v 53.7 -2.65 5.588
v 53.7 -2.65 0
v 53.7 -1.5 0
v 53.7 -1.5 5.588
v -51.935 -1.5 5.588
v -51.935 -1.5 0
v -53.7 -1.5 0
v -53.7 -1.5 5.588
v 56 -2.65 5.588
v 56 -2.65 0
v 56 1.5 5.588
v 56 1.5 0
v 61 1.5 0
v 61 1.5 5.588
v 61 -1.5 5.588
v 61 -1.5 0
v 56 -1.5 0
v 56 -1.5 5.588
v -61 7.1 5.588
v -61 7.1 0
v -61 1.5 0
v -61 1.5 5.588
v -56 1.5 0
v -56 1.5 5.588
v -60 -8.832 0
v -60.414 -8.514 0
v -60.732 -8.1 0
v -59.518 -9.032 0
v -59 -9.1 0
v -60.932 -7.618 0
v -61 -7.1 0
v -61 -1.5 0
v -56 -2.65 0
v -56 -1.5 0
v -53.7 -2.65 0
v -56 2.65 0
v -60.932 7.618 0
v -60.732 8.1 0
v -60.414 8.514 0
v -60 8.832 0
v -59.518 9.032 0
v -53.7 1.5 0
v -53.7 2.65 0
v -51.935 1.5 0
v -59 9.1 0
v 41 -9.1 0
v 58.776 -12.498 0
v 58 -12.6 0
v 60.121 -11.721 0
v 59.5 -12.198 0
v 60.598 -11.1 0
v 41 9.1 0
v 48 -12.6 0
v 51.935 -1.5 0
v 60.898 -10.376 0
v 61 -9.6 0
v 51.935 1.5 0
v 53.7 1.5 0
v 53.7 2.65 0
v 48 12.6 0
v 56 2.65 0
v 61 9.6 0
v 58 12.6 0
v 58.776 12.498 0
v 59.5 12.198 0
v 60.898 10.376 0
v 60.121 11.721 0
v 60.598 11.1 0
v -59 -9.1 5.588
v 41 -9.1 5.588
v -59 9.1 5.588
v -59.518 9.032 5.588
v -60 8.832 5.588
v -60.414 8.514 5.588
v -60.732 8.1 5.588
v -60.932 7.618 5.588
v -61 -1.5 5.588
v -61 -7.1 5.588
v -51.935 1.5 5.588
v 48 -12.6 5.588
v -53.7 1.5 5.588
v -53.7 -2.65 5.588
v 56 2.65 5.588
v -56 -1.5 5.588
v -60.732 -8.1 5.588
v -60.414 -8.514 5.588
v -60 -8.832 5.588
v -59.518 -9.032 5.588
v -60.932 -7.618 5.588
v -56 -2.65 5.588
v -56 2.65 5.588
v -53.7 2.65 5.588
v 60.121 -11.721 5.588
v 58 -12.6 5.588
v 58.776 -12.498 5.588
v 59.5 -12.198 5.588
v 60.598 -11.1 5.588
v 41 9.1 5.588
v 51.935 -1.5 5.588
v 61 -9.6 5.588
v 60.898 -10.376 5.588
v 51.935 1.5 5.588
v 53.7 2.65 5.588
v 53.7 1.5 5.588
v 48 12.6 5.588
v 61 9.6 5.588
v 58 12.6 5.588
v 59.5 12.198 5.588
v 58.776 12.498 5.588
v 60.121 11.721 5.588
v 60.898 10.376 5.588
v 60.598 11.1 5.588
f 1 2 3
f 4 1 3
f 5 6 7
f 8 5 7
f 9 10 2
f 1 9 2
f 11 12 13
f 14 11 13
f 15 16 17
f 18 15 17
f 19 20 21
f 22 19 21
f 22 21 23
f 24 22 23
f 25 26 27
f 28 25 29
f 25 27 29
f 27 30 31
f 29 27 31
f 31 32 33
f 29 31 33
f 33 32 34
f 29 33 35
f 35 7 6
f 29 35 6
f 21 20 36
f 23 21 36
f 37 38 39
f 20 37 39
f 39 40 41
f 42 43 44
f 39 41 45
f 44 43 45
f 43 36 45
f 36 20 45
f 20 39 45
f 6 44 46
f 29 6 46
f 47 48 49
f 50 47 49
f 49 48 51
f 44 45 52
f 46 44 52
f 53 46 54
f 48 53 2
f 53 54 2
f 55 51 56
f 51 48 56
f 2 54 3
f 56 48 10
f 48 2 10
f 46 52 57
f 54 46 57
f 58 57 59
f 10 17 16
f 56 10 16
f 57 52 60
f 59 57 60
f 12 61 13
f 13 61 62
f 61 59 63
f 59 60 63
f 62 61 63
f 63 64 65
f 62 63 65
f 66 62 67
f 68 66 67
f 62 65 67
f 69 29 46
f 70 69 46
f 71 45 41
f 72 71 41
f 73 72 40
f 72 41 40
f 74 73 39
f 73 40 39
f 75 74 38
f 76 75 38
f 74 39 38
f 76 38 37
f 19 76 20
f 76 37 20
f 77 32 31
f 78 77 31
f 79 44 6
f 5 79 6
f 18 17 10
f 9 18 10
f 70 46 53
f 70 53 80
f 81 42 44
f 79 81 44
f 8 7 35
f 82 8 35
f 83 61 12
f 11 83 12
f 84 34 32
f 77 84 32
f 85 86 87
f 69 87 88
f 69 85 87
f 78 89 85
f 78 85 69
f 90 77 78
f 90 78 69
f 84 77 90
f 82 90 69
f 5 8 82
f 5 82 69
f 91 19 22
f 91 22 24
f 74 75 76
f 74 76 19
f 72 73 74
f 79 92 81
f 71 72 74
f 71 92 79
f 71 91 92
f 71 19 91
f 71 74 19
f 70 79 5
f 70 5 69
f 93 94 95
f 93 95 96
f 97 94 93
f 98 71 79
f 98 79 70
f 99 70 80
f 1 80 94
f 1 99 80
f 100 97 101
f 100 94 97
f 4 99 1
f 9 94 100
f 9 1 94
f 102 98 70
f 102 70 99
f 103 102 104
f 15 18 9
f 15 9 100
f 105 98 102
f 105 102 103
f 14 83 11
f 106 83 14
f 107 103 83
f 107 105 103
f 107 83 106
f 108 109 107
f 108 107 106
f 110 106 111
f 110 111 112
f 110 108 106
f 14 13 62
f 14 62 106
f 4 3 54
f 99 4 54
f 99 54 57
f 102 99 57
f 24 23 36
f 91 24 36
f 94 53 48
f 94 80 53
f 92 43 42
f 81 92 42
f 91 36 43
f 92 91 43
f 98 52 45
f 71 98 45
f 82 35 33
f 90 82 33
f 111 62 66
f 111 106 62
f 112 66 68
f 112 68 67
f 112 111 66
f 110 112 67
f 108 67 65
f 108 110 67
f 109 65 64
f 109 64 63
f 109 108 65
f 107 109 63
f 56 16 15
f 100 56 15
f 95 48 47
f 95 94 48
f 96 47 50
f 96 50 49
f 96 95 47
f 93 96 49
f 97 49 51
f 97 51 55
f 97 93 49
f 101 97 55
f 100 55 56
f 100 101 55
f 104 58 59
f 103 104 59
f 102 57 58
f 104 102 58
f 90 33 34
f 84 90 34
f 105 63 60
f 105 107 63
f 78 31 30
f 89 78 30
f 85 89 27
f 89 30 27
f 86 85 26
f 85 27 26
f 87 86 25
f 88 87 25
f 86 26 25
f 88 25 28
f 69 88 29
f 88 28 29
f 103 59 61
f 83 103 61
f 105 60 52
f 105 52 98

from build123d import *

# Parameters (mm, degrees)
F1_DEPTH = 5.588
F2_W     = 20
F2_H     = 5.588
F3_DEPTH = 3.5
F4_SIZE2 = 6.99999
F4_SIZE  = 3.49999
F5_W     = 20
F5_H     = 5.588
F6_DEPTH = 3.5
F7_SIZE2 = 3.49999
F7_SIZE  = 6.99999
F8_R     = 3


# Not quite as in the source:
# - a fillet or chamfer is up to 0.001 mm smaller than in the source, because OpenCascade refuses the exact size


with BuildPart() as f1:
    # F0 (on Top) → F1 (new body)
    with BuildSketch(Plane.XY):
        with BuildLine():
            Line((61, 9.1), (-59, 9.1))
            ThreePointArc((-59, 9.1), (-60.4142135624, 8.5142135624), (-61, 7.1))
            Line((-61, 7.1), (-61, 1.5))
            Line((-61, 1.5), (-56, 1.5))
            Line((-56, 1.5), (-56, 2.65))
            Line((-56, 2.65), (-53.7, 2.65))
            Line((-53.7, 2.65), (-53.7, 1.5))
            Line((-53.7, 1.5), (-51.934869796, 1.5))
            Line((-51.934869796, 1.5), (-51.934869796, -1.5))
            Line((-51.934869796, -1.5), (-53.7, -1.5))
            Line((-53.7, -1.5), (-53.7, -2.65))
            Line((-53.7, -2.65), (-56, -2.65))
            Line((-56, -2.65), (-56, -1.5))
            Line((-56, -1.5), (-61, -1.5))
            Line((-61, -1.5), (-61, -7.1))
            ThreePointArc((-61, -7.1), (-60.4142135624, -8.5142135624), (-59, -9.1))
            Line((-59, -9.1), (61, -9.1))
            Line((61, -9.1), (61, -7.1))
            Line((61, -7.1), (61, -1.5))
            Line((61, -1.5), (56, -1.5))
            Line((56, -1.5), (56, -2.65))
            Line((56, -2.65), (53.7, -2.65))
            Line((53.7, -2.65), (53.7, -1.5))
            Line((53.7, -1.5), (51.934869796, -1.5))
            Line((51.934869796, -1.5), (51.934869796, 1.5))
            Line((51.934869796, 1.5), (53.7, 1.5))
            Line((53.7, 1.5), (53.7, 2.65))
            Line((53.7, 2.65), (56, 2.65))
            Line((56, 2.65), (56, 1.5))
            Line((56, 1.5), (61, 1.5))
            Line((61, 1.5), (61, 7.1))
            Line((61, 7.1), (61, 9.1))
        make_face()
    extrude(amount=F1_DEPTH)

    # F2 (on face) → F3 (join)
    with BuildSketch(Plane(origin=(0, 9.1, 0), x_dir=(-1, 0, 0), z_dir=(0, 1, 0))):
        with Locations((-51, 2.794)):
            Rectangle(F2_W, F2_H)
    extrude(amount=F3_DEPTH)

    # F4 (size 3.5 and 7 in the source; OpenCascade refuses exactly that, so slightly less here)
    f4_edges = [f1.edges().sort_by_distance(p)[0] for p in [
        (41, 12.6, 2.794),
    ]]
    f4_side = f1.faces().sort_by_distance((41, 10.85, 2.794))[0]
    chamfer(f4_edges, length=F4_SIZE, length2=F4_SIZE2, reference=f4_side)

    # F5 (on face) → F6 (join)
    with BuildSketch(Plane.XZ.offset(9.1)):
        with Locations((51, 2.794)):
            Rectangle(F5_W, F5_H)
    extrude(amount=F6_DEPTH)

    # F7 (size 7 and 3.5 in the source; OpenCascade refuses exactly that, so slightly less here)
    f7_edges = [f1.edges().sort_by_distance(p)[0] for p in [
        (41, -12.6, 2.794),
    ]]
    f7_side = f1.faces().sort_by_distance((51, -12.6, 2.794))[0]
    chamfer(f7_edges, length=F7_SIZE, length2=F7_SIZE2, reference=f7_side)

    # F8
    f8_edges = [f1.edges().sort_by_distance(p)[0] for p in [
        (61, 12.6, 2.794),
        (61, -12.6, 2.794),
    ]]
    fillet(f8_edges, radius=F8_R)


solid = f1.part
